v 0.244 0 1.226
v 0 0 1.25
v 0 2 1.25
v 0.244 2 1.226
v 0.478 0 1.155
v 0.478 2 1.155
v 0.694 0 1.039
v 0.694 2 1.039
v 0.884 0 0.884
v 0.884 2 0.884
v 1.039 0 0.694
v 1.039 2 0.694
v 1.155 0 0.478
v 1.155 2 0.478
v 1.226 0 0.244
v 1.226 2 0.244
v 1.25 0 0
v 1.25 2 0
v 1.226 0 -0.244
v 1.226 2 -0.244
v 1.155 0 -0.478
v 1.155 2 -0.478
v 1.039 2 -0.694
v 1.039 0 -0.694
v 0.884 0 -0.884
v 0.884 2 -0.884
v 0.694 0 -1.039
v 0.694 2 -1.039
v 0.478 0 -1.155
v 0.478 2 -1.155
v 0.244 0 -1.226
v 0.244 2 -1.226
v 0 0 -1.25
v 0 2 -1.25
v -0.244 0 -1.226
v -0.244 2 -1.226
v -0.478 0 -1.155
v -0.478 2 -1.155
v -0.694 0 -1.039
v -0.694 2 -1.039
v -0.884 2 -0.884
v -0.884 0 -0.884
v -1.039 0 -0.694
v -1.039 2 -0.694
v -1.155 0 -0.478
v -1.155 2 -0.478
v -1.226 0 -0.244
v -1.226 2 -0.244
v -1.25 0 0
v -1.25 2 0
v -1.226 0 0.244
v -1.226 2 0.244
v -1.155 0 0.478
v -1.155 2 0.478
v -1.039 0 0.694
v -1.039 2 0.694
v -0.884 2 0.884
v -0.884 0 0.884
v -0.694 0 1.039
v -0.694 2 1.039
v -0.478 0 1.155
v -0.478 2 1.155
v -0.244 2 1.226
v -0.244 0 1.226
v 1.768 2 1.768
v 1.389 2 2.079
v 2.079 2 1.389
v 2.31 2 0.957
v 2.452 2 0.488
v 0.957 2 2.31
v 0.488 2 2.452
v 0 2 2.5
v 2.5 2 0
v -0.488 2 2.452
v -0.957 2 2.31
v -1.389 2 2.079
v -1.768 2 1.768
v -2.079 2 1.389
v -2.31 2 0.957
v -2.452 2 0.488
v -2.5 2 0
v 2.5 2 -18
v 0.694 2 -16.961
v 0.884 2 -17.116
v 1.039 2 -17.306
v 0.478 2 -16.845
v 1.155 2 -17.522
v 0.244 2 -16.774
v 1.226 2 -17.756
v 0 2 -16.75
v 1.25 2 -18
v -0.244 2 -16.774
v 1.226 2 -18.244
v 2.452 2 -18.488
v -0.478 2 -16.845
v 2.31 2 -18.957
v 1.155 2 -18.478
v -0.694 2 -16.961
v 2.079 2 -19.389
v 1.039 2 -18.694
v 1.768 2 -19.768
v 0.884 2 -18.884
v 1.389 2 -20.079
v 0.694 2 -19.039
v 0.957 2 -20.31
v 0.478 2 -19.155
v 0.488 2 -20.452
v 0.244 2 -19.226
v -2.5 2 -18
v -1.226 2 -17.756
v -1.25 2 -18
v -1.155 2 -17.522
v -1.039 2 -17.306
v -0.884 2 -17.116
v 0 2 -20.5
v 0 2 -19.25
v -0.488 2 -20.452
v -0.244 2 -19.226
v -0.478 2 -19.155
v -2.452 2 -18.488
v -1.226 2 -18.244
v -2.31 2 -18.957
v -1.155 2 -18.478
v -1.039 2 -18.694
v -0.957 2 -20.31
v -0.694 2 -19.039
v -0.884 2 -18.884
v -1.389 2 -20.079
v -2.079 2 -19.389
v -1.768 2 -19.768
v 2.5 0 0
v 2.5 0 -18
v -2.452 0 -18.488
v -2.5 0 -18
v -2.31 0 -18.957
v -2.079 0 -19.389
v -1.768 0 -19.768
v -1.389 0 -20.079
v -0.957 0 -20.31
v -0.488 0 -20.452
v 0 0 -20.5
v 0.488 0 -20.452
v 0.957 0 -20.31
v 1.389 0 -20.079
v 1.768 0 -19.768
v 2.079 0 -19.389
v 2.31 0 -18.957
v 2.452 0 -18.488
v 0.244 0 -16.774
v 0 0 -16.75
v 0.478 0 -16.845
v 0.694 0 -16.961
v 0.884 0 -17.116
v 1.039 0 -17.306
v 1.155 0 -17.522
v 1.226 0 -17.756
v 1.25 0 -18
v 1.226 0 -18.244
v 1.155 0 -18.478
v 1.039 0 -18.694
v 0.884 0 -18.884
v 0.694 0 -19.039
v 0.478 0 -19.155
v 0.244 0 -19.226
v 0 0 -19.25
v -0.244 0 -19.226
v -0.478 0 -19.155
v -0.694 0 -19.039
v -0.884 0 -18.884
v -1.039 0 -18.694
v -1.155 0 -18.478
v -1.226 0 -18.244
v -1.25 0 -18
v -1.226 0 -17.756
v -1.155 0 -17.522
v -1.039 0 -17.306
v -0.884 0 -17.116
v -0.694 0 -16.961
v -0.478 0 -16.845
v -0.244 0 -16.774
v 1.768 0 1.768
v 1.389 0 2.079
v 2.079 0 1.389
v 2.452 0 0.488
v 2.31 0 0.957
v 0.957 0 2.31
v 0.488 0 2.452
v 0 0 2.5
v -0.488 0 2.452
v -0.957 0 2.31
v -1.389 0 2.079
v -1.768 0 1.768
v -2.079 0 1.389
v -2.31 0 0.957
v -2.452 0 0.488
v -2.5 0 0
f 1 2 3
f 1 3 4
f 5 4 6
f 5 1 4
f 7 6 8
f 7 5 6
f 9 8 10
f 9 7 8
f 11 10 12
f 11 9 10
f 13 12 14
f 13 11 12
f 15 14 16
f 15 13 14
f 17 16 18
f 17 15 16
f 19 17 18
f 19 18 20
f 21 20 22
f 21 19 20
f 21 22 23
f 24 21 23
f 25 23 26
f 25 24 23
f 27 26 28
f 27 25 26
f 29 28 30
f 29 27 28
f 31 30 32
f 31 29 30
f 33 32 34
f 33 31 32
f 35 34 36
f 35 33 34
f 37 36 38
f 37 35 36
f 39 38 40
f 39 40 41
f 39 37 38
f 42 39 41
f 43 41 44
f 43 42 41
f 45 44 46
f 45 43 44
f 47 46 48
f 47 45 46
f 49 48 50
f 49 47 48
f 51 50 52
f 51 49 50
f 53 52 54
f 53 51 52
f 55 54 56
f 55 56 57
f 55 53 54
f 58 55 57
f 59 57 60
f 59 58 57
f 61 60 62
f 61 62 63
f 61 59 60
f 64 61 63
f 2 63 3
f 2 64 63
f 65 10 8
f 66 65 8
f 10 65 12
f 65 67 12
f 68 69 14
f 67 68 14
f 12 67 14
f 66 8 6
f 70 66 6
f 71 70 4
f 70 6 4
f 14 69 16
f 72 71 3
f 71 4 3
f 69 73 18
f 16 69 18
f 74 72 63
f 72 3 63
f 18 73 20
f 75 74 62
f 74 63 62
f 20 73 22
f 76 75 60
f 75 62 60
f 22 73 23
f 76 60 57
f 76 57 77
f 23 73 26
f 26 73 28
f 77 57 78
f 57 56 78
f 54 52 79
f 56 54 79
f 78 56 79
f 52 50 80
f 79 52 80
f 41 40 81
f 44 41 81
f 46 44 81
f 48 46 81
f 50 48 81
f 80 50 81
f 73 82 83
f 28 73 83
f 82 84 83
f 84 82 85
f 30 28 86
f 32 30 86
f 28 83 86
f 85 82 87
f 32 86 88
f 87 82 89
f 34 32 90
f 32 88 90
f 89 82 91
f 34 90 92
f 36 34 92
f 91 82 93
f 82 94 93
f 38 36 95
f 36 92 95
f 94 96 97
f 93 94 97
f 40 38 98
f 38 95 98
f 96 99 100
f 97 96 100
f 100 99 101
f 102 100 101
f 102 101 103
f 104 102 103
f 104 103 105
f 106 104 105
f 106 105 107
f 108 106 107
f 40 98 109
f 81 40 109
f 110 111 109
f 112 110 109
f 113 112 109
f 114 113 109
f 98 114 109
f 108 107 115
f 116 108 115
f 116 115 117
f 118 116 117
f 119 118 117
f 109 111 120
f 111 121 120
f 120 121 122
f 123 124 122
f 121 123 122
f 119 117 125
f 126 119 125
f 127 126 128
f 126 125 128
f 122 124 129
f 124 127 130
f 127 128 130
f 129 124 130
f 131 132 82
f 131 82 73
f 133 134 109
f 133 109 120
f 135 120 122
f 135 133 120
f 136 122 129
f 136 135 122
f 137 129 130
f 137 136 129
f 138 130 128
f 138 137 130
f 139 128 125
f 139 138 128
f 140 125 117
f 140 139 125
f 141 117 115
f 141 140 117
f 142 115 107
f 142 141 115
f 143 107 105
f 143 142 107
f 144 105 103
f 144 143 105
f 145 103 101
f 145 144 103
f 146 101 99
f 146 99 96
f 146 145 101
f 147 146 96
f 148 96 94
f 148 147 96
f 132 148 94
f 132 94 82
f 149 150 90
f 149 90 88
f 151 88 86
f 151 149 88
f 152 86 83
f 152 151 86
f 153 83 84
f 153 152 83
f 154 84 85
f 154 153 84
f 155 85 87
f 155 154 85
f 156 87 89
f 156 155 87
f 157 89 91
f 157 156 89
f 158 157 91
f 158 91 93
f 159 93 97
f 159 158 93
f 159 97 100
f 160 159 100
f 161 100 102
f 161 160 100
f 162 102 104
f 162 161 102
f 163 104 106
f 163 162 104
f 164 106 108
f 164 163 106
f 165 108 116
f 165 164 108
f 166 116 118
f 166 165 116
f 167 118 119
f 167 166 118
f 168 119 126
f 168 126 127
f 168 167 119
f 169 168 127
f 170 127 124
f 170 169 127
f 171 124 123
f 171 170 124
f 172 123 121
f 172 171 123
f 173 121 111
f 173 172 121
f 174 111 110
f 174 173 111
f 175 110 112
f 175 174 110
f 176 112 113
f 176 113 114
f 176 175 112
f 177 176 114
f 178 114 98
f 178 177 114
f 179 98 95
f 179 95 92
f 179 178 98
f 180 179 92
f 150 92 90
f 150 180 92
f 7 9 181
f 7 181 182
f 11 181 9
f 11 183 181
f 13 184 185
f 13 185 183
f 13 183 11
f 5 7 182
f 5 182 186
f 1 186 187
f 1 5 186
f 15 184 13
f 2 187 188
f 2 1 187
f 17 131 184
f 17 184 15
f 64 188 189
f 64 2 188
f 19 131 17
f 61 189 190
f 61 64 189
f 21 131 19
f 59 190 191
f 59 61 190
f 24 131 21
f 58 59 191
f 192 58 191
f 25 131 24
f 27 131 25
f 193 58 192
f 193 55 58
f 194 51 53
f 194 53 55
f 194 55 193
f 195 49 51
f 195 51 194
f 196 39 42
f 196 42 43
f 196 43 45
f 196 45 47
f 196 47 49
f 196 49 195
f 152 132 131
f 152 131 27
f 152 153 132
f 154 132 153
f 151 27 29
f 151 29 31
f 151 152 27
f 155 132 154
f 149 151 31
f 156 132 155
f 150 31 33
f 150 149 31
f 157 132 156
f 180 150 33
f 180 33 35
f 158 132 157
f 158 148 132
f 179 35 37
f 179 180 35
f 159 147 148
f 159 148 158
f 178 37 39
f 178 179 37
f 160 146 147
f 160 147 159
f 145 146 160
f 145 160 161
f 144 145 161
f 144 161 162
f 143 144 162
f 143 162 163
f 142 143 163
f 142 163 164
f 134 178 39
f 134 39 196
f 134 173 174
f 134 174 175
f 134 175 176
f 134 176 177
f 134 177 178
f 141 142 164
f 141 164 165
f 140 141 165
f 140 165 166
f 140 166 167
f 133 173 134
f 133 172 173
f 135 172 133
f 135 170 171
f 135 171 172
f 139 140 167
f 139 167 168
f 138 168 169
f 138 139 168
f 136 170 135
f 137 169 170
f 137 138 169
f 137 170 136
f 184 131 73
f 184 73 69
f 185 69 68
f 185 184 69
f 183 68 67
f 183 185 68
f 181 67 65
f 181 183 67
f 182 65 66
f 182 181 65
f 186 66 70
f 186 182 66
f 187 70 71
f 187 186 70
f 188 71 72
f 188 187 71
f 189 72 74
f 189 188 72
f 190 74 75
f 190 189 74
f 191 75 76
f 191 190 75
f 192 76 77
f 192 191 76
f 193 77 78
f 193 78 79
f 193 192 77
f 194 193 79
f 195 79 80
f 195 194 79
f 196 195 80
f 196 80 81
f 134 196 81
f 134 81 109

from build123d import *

# Parameters (mm, degrees)
SKETCH1_R           = 1
BOSS_EXTRUDE1_DEPTH = 2
MOVE_FACE1_BY       = 0.25
MOVE_FACE1_2_BY     = 0.25


with BuildPart() as part:
    # Sketch1 → Boss-Extrude1 (new body)
    with BuildSketch(Plane(origin=(0, 0, 0), x_dir=(1, 0, 0), z_dir=(0, 1, 0))):
        with BuildLine():
            Line((-2.5, 0), (-2.5, 18))
            ThreePointArc((-2.5, 18), (0, 20.5), (2.5, 18))
            Line((2.5, 18), (2.5, 0))
            ThreePointArc((2.5, 0), (0, -2.5), (-2.5, 0))
        make_face()
        with Locations(Location((0, 18, 0), (0, 0, 270))):
            Circle(SKETCH1_R, mode=Mode.SUBTRACT)
        with Locations(Location((0, 0, 0), (0, 0, 270))):
            Circle(SKETCH1_R, mode=Mode.SUBTRACT)
    extrude(amount=BOSS_EXTRUDE1_DEPTH)

    # Move Face1: a curved face moved inward by 0.25
    add(Solid.thicken(part.faces().sort_by_distance((0, 1, -1))[0], -MOVE_FACE1_BY), mode=Mode.SUBTRACT)

    # Move Face1 2: a curved face moved inward by 0.25
    add(Solid.thicken(part.faces().sort_by_distance((0, 1, -19))[0], -MOVE_FACE1_2_BY), mode=Mode.SUBTRACT)


solid = part.part
